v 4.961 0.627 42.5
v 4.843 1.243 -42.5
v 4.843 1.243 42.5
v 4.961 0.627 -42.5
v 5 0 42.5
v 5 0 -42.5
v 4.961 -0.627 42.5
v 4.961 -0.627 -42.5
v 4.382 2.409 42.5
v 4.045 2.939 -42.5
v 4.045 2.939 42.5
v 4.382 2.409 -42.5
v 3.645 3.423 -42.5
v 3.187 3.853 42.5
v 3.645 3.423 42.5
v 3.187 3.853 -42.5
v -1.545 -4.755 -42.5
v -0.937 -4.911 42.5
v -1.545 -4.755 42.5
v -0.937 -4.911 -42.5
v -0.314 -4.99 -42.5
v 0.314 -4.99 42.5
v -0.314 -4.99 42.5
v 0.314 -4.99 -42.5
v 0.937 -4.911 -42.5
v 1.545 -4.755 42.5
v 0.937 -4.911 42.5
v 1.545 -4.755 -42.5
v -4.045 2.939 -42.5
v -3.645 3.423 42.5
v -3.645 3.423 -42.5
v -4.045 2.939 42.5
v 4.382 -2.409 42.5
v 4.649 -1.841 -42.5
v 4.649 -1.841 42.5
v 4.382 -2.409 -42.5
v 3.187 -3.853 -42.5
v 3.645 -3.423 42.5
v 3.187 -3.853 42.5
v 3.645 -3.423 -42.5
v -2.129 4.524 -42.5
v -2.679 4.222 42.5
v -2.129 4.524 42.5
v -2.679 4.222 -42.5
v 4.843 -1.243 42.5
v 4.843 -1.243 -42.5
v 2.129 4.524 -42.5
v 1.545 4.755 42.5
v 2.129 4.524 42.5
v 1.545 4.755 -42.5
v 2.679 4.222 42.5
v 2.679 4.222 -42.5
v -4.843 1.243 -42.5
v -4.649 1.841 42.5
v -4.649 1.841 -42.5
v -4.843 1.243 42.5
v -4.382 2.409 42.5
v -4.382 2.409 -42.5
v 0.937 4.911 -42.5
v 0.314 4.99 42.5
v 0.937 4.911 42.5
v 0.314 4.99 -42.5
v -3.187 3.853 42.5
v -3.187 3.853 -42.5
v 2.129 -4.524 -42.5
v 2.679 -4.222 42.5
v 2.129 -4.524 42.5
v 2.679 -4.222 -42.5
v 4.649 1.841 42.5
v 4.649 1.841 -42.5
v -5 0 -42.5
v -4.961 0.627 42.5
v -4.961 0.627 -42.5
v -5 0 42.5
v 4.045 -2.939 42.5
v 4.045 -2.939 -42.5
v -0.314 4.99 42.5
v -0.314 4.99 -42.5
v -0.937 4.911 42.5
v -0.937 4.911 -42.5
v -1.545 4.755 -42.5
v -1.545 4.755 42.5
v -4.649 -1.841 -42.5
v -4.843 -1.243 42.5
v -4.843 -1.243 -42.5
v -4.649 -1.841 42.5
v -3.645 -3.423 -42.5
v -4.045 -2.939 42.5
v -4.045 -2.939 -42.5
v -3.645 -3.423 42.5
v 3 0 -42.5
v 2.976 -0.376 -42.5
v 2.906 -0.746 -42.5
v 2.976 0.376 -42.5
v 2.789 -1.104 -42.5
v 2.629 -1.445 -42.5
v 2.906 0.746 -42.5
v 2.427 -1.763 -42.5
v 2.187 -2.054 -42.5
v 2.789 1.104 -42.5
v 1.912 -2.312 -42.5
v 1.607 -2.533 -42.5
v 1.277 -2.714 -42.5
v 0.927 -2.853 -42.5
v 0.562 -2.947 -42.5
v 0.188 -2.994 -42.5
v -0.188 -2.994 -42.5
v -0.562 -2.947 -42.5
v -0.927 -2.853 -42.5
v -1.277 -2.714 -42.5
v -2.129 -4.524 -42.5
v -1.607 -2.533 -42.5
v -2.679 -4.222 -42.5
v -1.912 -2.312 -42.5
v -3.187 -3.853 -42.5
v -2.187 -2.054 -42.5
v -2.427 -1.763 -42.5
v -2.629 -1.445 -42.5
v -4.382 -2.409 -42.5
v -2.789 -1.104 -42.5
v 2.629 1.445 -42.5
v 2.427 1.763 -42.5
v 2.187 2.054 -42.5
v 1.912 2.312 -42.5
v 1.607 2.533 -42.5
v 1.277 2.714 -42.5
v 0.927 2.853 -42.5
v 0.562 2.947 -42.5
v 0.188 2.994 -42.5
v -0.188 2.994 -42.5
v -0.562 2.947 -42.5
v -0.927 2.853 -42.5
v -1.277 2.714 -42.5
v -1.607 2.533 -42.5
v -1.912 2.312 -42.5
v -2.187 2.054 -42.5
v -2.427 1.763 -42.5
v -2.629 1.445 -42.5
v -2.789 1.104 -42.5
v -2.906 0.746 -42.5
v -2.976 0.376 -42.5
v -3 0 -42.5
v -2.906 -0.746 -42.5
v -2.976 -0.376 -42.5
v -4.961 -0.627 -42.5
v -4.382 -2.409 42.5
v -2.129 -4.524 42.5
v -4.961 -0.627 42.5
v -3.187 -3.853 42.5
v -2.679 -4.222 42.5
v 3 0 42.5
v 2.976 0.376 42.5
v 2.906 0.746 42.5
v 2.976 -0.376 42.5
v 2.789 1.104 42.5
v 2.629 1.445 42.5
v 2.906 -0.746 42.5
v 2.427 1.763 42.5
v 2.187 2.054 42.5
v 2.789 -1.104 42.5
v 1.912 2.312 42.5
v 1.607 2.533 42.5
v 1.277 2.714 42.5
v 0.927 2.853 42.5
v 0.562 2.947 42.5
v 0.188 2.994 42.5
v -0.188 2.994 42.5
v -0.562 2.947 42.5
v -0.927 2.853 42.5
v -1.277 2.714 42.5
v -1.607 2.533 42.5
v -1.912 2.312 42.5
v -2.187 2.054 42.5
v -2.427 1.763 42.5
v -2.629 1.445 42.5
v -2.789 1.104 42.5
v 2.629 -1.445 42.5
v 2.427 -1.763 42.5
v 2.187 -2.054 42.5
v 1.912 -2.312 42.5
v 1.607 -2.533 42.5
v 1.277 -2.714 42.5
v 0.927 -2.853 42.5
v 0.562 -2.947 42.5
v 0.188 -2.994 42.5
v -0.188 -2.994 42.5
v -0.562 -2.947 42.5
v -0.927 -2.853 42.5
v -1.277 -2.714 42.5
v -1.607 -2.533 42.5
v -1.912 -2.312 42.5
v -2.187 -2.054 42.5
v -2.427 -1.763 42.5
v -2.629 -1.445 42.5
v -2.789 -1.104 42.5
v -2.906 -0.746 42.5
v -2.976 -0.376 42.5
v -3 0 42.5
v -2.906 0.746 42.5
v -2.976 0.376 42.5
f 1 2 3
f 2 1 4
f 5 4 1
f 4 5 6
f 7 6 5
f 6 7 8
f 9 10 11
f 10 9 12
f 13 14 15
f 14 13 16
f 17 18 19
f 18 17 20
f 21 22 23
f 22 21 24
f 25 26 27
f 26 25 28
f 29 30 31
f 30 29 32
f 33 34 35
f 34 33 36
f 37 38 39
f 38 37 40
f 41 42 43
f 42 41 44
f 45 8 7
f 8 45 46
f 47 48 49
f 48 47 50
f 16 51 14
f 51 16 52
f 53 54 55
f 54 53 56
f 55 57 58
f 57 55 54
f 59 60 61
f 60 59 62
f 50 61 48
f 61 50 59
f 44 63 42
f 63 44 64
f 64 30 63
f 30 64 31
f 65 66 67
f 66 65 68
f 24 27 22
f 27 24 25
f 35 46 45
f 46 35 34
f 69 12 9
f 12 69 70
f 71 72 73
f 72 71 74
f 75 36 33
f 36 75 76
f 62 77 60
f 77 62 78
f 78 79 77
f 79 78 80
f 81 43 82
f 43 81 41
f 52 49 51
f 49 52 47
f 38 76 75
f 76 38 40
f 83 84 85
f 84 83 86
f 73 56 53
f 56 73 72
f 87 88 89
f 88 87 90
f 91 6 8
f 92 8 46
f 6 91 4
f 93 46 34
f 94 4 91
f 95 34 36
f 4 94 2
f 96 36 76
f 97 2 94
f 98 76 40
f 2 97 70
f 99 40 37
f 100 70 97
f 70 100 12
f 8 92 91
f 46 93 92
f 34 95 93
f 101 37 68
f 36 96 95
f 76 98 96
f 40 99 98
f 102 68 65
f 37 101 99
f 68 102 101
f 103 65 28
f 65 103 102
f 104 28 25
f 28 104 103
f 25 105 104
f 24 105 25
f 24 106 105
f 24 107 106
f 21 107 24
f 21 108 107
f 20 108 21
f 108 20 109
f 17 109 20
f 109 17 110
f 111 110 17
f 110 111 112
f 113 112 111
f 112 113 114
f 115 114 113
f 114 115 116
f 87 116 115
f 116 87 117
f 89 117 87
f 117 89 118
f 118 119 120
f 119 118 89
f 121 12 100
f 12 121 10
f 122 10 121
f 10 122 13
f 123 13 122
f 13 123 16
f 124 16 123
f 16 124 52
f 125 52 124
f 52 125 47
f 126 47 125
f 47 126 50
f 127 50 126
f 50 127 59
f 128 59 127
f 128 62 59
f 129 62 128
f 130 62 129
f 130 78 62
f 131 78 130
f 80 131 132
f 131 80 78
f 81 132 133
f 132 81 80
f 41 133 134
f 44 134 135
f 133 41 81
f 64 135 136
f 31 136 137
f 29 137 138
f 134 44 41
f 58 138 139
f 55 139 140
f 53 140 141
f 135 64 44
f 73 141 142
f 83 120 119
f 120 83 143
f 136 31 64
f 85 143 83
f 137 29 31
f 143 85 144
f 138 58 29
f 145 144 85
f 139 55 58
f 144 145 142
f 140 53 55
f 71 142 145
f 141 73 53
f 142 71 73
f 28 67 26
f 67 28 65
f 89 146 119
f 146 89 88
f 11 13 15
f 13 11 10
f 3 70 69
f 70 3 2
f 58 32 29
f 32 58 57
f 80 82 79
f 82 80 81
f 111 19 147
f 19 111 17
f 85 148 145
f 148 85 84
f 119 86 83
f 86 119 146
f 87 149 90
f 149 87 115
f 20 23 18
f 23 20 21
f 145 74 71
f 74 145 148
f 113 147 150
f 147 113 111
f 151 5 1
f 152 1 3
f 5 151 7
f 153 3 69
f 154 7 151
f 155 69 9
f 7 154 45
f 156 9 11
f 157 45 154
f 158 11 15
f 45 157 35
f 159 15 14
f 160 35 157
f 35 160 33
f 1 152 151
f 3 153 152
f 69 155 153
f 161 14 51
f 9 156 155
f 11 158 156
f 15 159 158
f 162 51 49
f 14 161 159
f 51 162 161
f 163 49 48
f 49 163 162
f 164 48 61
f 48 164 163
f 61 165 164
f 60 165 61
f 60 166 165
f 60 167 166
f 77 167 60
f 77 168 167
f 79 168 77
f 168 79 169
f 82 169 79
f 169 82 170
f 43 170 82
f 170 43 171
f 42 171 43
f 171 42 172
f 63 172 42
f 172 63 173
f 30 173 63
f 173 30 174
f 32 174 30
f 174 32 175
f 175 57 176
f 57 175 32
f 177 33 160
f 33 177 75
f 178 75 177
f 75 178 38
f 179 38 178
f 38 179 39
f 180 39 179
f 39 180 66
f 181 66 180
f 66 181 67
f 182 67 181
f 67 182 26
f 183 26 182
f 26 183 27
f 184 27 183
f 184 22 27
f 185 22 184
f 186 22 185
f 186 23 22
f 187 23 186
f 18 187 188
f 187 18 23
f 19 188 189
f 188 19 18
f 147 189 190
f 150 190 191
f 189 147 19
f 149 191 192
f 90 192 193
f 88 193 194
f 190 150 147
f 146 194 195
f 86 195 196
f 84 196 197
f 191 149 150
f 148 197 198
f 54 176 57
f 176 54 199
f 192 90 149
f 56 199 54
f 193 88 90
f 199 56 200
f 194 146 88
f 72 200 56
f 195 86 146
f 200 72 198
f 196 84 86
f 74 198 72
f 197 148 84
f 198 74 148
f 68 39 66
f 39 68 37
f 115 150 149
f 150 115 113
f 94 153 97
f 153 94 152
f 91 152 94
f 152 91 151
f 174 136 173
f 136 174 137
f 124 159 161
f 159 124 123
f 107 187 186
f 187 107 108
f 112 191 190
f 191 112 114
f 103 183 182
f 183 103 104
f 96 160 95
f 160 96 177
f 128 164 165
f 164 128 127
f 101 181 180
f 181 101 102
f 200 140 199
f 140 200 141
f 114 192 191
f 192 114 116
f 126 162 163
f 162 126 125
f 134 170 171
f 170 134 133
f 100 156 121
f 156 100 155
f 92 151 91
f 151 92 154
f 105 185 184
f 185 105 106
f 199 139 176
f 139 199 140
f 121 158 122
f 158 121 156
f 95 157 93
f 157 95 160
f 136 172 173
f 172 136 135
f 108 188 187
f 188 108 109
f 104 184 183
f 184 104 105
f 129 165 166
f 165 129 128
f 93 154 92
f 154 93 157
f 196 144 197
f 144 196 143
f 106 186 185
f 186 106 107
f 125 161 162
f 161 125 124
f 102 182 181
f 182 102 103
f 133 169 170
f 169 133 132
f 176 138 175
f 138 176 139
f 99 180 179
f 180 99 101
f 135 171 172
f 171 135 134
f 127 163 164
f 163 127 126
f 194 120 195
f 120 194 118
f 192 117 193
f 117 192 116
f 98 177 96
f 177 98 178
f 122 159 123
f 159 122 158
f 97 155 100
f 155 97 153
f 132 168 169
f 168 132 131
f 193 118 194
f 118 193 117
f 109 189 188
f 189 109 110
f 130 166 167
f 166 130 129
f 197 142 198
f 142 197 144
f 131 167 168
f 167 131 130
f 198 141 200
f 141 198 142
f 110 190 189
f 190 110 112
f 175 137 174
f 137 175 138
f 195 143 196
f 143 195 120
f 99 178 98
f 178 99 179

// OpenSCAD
$fn = 50;


difference() {
	union() {
		translate(v = [0, 0, -42.5000000000]) {
			cylinder(h = 85, r = 5.0000000000);
		}
	}
	union() {
		translate(v = [0, 0, -100.0000000000]) {
			cylinder(h = 200, r = 3.0000000000);
		}
	}
}
